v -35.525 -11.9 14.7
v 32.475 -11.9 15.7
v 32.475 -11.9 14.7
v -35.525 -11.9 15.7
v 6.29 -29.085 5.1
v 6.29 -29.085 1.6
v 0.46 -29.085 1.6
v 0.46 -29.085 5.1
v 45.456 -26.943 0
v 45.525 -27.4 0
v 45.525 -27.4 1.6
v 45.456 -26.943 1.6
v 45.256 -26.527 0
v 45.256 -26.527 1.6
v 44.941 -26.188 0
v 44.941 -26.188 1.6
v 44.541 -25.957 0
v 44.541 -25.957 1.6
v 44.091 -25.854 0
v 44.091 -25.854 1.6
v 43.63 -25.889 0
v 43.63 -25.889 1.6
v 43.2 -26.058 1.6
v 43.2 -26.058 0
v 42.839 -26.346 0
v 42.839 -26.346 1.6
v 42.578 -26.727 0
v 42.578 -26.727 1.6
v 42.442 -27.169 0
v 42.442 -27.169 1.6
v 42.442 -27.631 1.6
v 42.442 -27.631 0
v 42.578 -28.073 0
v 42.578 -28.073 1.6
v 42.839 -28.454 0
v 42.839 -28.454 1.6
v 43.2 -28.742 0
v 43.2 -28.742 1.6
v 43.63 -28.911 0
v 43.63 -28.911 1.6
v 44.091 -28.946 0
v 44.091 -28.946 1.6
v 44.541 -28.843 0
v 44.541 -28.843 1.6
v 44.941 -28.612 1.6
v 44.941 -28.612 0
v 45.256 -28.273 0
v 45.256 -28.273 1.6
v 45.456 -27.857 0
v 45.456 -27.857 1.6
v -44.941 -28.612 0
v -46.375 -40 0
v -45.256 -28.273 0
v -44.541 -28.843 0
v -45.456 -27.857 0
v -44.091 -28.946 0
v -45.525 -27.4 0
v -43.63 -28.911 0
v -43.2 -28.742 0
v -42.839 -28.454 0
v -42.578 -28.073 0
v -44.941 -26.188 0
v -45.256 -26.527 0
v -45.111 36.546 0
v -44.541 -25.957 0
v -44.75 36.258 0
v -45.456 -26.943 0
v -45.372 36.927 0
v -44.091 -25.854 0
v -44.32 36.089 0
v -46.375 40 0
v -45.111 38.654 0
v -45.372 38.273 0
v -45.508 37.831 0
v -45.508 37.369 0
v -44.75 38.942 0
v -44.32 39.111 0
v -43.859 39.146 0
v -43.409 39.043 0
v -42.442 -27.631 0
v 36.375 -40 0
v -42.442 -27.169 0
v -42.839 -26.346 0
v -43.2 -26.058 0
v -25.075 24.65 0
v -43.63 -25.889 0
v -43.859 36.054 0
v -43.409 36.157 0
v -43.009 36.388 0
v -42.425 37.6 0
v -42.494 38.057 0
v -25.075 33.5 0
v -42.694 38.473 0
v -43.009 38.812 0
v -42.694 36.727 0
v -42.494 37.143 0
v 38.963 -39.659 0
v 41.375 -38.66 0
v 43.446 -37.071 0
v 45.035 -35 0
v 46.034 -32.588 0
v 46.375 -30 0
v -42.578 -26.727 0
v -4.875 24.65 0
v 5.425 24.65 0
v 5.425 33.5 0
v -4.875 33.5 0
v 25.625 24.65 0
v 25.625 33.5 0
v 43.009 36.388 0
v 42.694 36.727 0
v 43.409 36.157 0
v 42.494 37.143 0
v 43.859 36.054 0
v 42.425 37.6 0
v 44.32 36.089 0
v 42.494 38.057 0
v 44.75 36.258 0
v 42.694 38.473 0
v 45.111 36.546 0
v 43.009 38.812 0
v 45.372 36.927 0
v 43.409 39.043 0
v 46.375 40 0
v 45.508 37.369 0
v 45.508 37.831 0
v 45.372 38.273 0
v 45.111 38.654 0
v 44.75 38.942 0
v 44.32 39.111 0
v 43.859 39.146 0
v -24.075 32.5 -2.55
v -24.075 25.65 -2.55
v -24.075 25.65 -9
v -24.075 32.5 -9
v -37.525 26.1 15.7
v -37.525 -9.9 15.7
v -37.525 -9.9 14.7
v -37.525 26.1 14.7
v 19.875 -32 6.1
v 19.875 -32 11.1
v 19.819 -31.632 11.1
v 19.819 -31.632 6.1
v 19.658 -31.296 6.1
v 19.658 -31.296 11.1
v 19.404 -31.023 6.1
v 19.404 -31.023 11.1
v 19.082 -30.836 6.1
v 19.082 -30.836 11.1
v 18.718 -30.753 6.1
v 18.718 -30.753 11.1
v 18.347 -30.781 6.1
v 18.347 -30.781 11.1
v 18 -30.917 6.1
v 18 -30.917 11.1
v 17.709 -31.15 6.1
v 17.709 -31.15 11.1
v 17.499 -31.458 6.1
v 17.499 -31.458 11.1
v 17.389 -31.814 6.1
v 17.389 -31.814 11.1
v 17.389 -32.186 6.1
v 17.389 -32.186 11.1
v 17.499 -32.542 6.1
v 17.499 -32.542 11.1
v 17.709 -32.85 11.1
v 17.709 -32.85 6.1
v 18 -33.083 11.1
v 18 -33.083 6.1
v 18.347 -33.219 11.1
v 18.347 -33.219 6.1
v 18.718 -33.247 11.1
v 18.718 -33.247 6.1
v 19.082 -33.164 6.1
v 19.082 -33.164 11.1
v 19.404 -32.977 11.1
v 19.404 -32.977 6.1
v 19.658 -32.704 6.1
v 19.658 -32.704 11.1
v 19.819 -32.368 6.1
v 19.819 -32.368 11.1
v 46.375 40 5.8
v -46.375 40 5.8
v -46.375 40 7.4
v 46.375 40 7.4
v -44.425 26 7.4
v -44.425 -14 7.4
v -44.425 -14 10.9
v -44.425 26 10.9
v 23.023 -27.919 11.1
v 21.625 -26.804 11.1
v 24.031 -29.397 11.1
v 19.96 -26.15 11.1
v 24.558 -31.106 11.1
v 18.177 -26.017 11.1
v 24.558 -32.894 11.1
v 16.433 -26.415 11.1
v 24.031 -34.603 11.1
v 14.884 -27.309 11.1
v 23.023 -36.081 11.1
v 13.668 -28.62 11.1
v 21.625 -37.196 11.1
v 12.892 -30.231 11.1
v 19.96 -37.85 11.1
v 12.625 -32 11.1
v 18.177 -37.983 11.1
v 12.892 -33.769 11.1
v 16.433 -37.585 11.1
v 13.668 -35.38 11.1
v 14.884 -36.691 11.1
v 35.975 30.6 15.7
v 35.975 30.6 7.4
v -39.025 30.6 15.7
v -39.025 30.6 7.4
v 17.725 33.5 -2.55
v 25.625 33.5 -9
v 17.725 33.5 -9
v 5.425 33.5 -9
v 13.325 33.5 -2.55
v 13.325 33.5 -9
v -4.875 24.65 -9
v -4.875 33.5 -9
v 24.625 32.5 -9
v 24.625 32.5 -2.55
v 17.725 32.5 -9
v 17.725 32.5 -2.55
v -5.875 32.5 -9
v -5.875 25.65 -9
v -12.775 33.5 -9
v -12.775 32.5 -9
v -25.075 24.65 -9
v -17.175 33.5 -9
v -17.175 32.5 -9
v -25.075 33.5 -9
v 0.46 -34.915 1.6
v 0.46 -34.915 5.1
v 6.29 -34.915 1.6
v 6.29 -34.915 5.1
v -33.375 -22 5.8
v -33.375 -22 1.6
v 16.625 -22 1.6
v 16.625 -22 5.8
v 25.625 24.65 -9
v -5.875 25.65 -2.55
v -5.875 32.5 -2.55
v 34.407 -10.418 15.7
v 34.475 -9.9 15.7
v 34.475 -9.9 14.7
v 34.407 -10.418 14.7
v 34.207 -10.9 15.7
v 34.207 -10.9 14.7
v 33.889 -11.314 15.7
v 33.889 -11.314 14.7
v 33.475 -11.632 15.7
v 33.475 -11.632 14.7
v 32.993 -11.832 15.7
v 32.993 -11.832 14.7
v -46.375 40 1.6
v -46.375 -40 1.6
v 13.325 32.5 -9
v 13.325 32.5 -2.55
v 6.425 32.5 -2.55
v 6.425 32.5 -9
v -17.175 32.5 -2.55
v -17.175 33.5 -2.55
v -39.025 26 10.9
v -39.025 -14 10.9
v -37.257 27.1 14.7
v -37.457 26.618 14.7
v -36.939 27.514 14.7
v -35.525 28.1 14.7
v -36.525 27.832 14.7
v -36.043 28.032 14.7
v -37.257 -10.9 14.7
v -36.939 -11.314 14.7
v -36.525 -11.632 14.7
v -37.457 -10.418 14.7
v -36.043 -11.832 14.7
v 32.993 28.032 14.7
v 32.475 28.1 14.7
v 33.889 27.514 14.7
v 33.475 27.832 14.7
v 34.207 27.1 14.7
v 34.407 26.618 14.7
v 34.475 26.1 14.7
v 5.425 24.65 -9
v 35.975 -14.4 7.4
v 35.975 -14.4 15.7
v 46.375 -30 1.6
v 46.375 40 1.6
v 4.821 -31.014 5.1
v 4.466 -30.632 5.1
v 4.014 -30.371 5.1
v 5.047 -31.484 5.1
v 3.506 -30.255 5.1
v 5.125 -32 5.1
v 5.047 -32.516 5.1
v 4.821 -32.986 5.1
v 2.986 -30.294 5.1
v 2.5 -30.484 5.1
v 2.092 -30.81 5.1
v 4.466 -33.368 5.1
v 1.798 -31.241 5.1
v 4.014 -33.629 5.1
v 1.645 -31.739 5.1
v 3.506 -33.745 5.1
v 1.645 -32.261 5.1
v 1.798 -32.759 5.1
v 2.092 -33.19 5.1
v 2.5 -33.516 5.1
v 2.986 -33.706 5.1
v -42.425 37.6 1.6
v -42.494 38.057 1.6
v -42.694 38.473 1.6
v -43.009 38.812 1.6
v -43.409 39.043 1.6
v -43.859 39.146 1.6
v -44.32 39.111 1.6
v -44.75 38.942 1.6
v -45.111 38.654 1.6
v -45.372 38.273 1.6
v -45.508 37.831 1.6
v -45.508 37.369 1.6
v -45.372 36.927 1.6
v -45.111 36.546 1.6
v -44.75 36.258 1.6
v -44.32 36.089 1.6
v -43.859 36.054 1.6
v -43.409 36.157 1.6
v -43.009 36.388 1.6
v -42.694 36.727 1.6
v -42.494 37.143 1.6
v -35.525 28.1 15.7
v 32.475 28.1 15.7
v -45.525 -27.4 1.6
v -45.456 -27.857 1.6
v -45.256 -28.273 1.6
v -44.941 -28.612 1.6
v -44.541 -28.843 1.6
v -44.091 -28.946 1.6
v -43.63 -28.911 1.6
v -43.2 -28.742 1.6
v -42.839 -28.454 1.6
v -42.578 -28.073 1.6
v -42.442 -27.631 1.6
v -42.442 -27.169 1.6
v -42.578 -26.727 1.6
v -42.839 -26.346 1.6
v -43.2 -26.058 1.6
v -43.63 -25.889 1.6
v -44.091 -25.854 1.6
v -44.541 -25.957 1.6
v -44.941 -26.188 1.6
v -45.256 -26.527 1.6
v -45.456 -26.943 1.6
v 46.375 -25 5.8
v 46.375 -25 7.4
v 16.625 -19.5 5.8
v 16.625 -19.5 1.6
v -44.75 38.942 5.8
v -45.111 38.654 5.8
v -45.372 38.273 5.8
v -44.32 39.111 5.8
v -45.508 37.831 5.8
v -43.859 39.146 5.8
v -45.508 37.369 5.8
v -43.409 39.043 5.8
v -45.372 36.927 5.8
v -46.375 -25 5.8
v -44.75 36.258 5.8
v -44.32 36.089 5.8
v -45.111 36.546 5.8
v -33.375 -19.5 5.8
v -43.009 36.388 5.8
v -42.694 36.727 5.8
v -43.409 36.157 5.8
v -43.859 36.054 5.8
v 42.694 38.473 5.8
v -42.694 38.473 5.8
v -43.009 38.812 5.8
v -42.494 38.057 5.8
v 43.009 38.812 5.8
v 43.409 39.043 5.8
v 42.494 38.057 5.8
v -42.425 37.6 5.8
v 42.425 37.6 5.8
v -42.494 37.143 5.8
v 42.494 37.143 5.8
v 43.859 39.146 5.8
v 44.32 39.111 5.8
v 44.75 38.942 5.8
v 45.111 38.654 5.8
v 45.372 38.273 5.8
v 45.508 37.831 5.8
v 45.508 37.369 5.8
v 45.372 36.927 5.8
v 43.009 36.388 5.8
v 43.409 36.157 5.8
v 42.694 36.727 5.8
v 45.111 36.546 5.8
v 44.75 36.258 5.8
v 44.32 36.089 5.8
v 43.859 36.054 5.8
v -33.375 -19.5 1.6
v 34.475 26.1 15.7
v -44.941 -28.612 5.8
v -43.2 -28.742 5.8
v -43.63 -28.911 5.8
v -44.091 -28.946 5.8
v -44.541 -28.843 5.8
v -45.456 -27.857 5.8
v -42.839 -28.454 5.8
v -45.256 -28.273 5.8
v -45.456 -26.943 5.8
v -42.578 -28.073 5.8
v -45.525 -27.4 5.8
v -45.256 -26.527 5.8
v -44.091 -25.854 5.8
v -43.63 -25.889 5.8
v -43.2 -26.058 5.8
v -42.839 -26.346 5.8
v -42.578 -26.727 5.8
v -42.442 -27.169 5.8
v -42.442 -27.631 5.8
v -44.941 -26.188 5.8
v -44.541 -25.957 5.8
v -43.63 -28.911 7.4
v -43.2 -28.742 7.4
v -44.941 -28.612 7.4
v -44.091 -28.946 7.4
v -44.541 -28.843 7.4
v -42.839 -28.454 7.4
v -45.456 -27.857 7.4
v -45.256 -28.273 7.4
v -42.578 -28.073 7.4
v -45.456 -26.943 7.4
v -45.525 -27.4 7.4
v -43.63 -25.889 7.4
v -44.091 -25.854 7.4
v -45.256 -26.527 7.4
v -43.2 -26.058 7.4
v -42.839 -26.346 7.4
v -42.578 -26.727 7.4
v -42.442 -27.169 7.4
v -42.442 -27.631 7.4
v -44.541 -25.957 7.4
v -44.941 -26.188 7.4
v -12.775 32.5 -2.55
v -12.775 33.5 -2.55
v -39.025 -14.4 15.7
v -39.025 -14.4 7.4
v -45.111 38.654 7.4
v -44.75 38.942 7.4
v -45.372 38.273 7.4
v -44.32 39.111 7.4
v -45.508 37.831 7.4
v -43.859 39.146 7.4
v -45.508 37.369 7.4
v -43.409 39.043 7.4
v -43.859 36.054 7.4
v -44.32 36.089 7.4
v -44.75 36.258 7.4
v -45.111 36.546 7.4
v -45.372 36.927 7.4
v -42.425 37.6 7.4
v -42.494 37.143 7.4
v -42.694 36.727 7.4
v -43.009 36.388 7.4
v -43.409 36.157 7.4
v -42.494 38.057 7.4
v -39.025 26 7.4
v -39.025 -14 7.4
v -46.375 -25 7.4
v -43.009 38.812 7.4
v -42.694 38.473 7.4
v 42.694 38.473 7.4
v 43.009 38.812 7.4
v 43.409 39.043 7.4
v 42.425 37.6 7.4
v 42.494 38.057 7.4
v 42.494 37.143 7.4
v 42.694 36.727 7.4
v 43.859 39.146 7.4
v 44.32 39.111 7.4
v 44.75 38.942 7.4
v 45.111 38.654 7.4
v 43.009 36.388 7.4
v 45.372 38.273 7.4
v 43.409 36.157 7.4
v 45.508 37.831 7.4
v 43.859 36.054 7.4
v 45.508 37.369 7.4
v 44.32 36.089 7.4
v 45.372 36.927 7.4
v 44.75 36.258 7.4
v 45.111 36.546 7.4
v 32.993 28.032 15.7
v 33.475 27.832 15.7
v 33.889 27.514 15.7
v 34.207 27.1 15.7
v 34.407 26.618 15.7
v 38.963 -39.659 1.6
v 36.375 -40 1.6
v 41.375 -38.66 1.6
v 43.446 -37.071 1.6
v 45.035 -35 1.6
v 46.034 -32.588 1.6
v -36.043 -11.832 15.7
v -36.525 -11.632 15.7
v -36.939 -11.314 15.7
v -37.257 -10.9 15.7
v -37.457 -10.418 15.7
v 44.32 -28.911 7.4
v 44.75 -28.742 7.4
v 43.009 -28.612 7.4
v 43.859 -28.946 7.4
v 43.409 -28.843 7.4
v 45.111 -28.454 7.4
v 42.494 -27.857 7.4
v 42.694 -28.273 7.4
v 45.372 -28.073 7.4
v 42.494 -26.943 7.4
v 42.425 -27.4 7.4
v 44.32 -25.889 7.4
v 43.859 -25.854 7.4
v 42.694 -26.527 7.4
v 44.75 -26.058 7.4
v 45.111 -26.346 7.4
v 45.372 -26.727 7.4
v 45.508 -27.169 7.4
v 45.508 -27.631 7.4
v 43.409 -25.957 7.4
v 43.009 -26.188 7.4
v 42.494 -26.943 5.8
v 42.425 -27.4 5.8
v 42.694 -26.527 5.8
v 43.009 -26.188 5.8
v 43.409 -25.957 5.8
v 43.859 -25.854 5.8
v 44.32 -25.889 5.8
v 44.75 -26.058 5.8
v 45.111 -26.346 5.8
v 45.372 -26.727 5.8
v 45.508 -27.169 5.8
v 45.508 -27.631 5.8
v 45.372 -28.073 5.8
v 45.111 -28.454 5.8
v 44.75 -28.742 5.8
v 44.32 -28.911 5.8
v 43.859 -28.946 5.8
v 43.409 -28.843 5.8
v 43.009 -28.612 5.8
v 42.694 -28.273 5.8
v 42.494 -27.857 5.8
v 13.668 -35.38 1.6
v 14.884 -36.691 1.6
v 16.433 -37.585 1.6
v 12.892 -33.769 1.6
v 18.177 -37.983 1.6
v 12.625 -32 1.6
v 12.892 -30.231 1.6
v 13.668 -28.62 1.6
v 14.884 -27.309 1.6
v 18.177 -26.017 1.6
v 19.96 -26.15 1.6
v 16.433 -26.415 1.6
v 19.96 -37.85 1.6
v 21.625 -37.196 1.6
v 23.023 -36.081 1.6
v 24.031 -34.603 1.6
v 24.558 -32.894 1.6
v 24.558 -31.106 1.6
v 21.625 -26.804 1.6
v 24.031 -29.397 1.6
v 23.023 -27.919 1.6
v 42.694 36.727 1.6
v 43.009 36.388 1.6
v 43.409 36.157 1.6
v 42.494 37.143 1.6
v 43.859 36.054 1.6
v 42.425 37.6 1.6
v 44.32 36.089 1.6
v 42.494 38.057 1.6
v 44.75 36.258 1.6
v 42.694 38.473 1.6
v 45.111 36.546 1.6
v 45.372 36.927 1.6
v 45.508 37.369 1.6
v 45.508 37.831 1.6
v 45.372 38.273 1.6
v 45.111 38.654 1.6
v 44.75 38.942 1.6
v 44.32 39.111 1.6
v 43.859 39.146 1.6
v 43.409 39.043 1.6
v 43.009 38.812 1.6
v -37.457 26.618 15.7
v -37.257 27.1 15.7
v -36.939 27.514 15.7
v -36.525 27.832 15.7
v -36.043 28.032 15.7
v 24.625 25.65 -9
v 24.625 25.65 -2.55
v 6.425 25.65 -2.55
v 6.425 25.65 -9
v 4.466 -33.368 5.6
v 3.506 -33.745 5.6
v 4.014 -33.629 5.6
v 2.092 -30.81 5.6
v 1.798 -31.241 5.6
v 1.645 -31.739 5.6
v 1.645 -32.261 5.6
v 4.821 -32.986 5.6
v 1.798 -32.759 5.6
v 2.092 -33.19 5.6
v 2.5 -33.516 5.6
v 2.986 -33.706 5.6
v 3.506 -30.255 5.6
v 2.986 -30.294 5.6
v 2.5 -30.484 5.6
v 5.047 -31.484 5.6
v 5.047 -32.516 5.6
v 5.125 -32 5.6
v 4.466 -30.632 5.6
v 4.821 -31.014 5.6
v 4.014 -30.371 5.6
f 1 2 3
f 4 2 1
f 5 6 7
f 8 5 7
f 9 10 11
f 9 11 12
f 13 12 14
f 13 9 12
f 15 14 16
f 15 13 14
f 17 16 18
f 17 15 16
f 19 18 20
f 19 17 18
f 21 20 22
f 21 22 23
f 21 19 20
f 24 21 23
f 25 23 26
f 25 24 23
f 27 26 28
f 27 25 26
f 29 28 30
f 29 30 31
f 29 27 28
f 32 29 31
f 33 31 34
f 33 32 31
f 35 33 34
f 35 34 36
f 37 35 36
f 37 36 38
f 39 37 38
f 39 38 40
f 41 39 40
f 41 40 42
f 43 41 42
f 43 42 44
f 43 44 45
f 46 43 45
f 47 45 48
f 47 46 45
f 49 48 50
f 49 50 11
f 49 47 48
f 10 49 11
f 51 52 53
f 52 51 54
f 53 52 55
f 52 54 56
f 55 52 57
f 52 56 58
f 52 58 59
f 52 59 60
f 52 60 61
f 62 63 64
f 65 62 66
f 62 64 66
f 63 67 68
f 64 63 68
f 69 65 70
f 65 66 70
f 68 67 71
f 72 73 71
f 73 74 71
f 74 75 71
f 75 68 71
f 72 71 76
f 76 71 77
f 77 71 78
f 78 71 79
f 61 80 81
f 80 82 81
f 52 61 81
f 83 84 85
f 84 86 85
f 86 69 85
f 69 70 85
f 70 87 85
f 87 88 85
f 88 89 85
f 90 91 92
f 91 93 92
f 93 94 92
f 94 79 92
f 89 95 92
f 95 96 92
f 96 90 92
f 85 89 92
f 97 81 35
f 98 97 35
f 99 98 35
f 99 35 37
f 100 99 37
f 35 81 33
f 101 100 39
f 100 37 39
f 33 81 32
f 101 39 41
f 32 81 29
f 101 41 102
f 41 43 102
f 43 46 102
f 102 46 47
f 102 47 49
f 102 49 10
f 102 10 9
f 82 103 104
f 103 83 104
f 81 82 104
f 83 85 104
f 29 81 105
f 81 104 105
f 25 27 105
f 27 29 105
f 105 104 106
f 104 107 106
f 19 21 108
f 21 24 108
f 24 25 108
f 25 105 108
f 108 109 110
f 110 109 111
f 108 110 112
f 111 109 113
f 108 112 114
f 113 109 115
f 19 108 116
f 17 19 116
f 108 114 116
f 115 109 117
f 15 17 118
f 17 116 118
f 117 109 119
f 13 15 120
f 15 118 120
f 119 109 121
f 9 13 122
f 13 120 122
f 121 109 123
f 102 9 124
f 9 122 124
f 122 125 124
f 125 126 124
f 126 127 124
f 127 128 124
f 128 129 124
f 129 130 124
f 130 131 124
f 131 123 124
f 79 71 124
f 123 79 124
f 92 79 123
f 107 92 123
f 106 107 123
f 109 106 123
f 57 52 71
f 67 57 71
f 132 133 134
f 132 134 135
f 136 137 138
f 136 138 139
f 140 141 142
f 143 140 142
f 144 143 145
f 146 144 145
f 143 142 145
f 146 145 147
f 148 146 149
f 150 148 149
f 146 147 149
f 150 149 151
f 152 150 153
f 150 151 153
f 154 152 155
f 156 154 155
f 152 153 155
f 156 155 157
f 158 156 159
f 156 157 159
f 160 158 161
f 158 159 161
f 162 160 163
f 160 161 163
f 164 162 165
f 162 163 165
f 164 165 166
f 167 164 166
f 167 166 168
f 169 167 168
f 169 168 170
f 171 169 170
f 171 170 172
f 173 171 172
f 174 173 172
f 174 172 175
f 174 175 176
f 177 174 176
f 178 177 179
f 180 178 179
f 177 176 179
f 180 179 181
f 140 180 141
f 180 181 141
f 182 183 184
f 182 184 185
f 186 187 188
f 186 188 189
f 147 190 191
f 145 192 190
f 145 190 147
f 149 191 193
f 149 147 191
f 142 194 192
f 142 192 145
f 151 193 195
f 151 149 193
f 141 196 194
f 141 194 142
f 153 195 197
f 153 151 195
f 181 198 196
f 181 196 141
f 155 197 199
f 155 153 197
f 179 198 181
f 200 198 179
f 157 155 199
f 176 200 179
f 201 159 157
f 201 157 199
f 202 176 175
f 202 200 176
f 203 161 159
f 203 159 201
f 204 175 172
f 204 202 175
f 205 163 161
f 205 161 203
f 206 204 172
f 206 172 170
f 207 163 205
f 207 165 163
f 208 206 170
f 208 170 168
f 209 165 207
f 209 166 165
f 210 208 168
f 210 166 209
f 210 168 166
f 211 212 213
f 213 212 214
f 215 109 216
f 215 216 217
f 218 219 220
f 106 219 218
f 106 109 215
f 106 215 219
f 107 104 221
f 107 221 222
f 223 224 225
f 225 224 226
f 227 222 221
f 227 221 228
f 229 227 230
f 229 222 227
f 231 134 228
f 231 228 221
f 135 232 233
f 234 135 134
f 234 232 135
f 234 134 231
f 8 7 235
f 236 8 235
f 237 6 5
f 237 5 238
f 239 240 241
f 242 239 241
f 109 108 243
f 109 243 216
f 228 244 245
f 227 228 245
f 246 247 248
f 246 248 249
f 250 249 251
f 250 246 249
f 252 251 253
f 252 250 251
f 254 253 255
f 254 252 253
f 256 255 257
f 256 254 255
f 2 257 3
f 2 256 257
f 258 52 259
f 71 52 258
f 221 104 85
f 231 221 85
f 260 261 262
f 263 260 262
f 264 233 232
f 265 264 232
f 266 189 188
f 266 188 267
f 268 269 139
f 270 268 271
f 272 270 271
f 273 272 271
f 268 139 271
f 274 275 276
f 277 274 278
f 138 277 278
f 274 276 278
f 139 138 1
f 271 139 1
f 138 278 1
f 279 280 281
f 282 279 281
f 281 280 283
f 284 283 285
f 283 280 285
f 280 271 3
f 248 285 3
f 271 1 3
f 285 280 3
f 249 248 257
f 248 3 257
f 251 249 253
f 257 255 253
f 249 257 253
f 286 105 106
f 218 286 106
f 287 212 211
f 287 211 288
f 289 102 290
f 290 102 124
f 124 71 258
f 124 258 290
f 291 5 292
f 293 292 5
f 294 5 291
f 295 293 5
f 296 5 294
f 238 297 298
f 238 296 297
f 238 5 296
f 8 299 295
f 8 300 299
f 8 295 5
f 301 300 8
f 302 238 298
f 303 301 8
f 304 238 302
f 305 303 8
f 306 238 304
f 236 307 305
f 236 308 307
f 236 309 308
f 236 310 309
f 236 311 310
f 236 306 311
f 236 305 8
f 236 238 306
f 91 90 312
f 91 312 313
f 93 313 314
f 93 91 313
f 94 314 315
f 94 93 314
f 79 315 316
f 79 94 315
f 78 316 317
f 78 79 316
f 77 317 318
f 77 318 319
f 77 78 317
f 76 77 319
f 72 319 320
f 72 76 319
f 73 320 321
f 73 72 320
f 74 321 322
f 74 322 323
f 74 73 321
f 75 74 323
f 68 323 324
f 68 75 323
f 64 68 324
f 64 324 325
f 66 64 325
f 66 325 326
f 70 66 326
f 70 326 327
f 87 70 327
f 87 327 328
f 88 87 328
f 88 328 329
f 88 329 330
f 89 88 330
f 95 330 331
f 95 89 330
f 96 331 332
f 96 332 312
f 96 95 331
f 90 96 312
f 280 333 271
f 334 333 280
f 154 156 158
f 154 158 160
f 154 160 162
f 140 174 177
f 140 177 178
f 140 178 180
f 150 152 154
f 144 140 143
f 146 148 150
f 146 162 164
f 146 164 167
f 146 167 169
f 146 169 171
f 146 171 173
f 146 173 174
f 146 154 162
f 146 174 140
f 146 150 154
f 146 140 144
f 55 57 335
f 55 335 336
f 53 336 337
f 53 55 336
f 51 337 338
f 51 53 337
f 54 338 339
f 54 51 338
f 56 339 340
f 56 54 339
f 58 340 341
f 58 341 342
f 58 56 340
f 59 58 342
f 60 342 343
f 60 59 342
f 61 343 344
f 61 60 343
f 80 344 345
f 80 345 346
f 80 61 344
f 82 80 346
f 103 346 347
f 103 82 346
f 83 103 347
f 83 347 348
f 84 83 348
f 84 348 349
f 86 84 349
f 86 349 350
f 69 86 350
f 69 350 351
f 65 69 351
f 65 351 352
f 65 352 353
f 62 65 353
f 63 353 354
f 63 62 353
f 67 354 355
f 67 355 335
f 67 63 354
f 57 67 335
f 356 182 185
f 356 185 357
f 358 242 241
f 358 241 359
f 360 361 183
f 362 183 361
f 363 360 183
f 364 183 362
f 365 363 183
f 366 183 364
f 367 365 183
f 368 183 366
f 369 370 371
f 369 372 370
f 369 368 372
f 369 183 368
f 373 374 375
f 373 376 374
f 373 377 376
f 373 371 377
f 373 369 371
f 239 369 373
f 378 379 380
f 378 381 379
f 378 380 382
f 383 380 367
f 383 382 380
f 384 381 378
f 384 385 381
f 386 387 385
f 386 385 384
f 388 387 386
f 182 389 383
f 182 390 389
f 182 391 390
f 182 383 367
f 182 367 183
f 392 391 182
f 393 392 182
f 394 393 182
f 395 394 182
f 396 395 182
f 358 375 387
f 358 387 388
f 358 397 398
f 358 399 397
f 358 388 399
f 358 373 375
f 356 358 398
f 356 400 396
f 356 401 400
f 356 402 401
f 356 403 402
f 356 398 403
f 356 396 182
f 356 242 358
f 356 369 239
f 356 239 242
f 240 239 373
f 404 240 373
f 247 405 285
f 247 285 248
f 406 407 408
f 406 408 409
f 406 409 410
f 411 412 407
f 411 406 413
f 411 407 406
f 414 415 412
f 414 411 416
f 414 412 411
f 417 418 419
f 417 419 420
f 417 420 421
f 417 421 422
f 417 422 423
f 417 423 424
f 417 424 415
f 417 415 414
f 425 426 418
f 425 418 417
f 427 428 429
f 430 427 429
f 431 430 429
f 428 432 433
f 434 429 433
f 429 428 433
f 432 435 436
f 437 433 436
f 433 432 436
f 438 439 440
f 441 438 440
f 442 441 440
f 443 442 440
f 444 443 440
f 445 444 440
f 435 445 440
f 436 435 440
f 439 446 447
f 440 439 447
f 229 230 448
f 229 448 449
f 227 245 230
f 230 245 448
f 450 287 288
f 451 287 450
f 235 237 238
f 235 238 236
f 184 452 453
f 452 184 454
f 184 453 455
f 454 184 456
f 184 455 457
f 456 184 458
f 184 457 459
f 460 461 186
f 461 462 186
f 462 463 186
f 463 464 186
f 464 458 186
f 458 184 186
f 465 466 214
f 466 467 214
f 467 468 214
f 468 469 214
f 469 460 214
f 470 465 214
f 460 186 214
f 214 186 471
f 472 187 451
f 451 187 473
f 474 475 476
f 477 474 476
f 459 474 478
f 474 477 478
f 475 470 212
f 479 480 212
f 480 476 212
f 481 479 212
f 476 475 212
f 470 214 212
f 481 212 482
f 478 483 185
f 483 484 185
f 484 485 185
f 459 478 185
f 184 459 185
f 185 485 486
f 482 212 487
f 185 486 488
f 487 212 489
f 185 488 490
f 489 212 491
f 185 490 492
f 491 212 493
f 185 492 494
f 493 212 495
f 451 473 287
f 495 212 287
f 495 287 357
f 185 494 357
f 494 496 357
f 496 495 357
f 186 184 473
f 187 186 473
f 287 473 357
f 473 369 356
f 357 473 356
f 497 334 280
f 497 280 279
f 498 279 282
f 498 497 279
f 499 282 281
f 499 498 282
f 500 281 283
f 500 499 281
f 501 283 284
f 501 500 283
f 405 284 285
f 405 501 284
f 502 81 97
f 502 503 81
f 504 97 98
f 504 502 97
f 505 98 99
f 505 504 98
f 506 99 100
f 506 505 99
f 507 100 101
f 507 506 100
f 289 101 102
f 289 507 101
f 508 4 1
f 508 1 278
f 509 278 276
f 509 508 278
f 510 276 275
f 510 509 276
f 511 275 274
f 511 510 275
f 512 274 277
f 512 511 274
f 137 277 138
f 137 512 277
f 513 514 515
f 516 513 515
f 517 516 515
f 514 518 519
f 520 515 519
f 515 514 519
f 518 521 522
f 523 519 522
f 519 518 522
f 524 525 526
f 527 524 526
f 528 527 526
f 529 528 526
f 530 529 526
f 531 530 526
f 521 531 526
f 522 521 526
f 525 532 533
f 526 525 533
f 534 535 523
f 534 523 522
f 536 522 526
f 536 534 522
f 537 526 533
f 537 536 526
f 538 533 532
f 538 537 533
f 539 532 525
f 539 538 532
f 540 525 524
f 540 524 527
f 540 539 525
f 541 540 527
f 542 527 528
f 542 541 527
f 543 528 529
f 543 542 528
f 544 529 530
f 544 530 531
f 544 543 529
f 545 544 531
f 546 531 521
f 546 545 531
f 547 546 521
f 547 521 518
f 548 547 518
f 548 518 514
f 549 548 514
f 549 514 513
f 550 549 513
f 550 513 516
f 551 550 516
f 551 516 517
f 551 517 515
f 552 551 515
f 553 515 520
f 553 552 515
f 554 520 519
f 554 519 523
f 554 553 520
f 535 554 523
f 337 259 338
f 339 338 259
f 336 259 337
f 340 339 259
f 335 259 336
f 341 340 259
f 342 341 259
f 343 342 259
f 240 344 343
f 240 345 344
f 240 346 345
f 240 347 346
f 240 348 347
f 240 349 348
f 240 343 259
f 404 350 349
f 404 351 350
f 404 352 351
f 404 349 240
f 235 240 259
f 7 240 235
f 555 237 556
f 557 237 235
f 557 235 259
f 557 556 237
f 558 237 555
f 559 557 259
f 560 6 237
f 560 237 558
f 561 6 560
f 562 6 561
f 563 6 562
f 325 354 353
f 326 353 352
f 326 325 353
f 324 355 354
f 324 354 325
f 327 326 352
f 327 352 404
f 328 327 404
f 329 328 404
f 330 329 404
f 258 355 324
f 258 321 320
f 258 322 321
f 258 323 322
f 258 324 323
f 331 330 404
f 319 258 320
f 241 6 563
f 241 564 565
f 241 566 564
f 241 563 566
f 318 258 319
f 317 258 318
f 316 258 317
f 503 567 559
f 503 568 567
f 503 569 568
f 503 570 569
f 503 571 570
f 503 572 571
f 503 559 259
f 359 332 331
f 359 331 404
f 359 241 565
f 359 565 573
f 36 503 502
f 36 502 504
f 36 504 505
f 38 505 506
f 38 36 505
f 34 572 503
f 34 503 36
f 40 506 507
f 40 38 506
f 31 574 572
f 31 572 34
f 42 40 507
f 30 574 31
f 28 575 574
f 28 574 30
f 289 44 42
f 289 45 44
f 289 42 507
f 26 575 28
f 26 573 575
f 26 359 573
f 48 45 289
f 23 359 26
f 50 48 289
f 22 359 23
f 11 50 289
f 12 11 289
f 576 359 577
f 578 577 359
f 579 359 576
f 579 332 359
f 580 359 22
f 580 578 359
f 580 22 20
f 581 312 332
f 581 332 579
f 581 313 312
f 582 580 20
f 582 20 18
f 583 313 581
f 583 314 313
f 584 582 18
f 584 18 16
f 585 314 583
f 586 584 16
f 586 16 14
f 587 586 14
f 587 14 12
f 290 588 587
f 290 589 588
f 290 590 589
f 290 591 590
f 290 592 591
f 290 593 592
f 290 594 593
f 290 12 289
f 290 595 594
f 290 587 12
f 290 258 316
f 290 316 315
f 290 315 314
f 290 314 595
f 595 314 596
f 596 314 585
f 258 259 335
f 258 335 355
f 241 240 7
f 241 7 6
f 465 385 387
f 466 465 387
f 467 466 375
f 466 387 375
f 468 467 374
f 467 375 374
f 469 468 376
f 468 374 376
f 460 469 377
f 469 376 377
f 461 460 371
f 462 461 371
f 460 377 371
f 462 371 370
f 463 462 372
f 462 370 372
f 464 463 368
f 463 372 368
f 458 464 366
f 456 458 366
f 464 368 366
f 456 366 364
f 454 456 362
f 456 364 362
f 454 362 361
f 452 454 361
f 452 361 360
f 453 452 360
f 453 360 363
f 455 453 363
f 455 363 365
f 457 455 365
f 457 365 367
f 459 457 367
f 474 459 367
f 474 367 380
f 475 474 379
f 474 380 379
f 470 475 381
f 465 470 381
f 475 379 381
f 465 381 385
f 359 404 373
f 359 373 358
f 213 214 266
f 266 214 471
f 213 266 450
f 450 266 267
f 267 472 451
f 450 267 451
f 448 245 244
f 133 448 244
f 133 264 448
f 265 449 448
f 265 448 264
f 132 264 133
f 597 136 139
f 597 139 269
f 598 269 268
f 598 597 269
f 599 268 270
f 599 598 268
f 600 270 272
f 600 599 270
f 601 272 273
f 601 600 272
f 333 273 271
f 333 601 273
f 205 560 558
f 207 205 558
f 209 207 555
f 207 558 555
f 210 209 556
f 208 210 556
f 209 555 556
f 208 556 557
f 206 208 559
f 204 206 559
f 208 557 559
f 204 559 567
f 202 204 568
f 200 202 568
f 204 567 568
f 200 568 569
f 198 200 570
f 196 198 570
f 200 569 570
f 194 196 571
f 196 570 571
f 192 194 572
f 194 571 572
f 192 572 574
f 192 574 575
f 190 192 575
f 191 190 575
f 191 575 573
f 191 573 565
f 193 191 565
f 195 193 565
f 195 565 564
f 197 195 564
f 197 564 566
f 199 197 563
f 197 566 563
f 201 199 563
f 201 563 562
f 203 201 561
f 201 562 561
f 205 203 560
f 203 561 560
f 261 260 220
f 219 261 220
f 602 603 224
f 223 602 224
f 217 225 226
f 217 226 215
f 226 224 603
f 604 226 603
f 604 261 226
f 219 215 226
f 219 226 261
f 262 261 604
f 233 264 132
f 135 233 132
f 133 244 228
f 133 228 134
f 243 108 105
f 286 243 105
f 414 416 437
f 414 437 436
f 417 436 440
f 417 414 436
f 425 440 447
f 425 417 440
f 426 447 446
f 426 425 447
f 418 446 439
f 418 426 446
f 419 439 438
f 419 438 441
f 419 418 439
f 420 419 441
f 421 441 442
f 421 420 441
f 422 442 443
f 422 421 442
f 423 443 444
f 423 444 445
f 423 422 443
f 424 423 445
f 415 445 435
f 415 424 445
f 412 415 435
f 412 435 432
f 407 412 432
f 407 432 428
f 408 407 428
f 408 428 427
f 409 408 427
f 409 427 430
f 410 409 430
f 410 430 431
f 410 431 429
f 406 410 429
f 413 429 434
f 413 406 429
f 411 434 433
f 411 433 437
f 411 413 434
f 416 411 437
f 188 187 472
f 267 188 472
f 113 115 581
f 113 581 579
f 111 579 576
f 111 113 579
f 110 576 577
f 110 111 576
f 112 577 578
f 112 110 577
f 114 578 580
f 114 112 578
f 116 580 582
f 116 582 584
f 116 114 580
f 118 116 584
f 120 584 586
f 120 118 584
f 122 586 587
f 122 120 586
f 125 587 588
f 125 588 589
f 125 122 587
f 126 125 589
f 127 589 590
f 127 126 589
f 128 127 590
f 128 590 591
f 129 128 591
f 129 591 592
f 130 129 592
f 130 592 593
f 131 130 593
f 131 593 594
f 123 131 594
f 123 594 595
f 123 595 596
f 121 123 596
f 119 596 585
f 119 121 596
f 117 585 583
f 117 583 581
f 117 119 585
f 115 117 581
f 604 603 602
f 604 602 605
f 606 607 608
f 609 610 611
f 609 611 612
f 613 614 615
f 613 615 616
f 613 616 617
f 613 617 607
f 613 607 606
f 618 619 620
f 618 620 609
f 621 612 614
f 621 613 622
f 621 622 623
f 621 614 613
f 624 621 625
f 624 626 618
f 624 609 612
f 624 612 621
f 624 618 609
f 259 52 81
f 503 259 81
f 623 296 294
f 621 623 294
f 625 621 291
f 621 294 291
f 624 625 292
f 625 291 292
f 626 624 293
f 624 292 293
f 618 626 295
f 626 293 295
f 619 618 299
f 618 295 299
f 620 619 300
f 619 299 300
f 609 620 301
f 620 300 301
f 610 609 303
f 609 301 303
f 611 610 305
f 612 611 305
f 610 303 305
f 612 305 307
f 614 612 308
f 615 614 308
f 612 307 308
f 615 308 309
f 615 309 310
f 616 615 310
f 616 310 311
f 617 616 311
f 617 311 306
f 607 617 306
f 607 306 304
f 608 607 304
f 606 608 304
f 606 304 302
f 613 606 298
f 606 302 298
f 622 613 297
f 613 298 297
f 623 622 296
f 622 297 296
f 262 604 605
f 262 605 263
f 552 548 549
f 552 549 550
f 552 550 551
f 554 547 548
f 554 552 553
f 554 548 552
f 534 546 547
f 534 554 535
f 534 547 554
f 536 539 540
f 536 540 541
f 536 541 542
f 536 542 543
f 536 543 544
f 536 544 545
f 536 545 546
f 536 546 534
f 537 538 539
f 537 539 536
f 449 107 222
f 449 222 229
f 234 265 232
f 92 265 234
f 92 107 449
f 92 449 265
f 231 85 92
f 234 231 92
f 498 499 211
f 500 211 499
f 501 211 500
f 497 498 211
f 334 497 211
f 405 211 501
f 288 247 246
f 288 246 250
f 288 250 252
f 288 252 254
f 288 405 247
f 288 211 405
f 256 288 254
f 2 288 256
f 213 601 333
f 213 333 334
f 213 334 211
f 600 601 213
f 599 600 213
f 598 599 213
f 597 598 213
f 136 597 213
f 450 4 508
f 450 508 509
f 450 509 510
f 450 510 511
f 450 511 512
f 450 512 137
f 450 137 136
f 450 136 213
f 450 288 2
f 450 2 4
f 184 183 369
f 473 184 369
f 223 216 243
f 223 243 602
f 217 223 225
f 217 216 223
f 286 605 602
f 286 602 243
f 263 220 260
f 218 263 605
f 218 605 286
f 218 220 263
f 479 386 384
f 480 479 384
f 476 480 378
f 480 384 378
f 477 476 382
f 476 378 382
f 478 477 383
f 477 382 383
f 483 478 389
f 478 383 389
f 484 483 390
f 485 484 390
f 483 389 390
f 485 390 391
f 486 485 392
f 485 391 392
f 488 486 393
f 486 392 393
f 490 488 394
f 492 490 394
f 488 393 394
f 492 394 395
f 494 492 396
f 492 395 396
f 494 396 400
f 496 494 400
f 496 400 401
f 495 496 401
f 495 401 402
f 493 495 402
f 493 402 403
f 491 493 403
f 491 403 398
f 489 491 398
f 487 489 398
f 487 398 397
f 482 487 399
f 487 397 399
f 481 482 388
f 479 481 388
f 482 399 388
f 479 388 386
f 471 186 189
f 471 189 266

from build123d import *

# Parameters (mm, degrees)
SKETCH1_W                             = 92.75
SKETCH1_H                             = 80
SKETCH1_R                             = 1.55
BOSS_EXTRUDE1_FIRST_PCB_DEPTH         = 1.6
SKETCH2_R                             = 6
BOSS_EXTRUDE2_SPEAKER_DEPTH           = 9.5
SKETCH15_R                            = 1.25
CUT_EXTRUDE1_SPEAKER_HOLE_DEPTH       = 5
SKETCH4_W                             = 5.83
SKETCH4_H                             = 5.83
BOSS_EXTRUDE4_RESET_SWITCH_DEPTH      = 3.5
SKETCH5_R                             = 1.75
BOSS_EXTRUDE5_RESET_BUTTON_DEPTH      = 0.5
SKETCH19_W                            = 50
SKETCH19_H                            = 2.5
BOSS_EXTRUDE10_CONNECTOR_DEPTH        = 4.2
SKETCH11_R                            = 1.55
SKETCH11_W                            = 92.75
SKETCH11_H                            = 65
BOSS_EXTRUDE11_UPPER_PCB_DEPTH        = 1.6
SKETCH12_W                            = 75
SKETCH12_H                            = 45
BOSS_EXTRUDE12_LCD_DEPTH              = 8.3
SKETCH24_W                            = 5.4
SKETCH24_H                            = 40
BOSS_EXTRUDE13_LCD_BUMPOUT_DEPTH      = 3.5
CUT_EXTRUDE2_SCREEN_RECESS_DEPTH      = 1
SKETCH21_W                            = 20.2
SKETCH21_H                            = 8.85
SKETCH21_W_2                          = 18.2
SKETCH21_H_2                          = 6.85
BOSS_EXTRUDE14_CONNECTORS_DEPTH       = 9
SKETCH22_W                            = 18.2
SKETCH22_H                            = 6.85
BOSS_EXTRUDE15_CONNECTOR_RECESS_DEPTH = 2.55
SKETCH23_W                            = 4.4
SKETCH23_H                            = 1
CUT_EXTRUDE3_CONNECTOR_NOTCH_DEPTH    = 6.45
FILLET1_R                             = 10


with BuildPart() as part:
    # Sketch1 → Boss-Extrude1 - First PCB (new body)
    with BuildSketch(Plane.XY):
        Rectangle(SKETCH1_W, SKETCH1_H)
        with Locations((-43.975, 37.6)):
            Circle(SKETCH1_R, mode=Mode.SUBTRACT)
        with Locations(Location((43.975, 37.6, 0), (0, 0, 180))):
            Circle(SKETCH1_R, mode=Mode.SUBTRACT)
        with Locations((43.975, -27.4)):
            Circle(SKETCH1_R, mode=Mode.SUBTRACT)
        with Locations(Location((-43.975, -27.4, 0), (0, 0, 180))):
            Circle(SKETCH1_R, mode=Mode.SUBTRACT)
    extrude(amount=BOSS_EXTRUDE1_FIRST_PCB_DEPTH)

    # Sketch2 → Boss-Extrude2 - Speaker (add)
    with BuildSketch(Plane.XY.offset(1.6)):
        with Locations(Location((18.625, -32, 0), (0, 0, 180))):
            Circle(SKETCH2_R)
    extrude(amount=BOSS_EXTRUDE2_SPEAKER_DEPTH)

    # Sketch15 → Cut-Extrude1 - Speaker Hole (cut)
    with BuildSketch(Plane.XY.offset(11.1)):
        with Locations((18.625, -32)):
            Circle(SKETCH15_R)
    extrude(amount=-CUT_EXTRUDE1_SPEAKER_HOLE_DEPTH, mode=Mode.SUBTRACT)

    # Sketch4 → Boss-Extrude4 - Reset Switch (add)
    with BuildSketch(Plane(origin=(0, 0, 1.6), x_dir=(-1, 0, 0), z_dir=(0, 0, 1))):
        with Locations((-3.375, 32)):
            Rectangle(SKETCH4_W, SKETCH4_H)
    extrude(amount=BOSS_EXTRUDE4_RESET_SWITCH_DEPTH)

    # Sketch5 → Boss-Extrude5 - Reset Button (add)
    with BuildSketch(Plane(origin=(0, 0, 5.1), x_dir=(-1, 0, 0), z_dir=(0, 0, 1))):
        with Locations(Location((-3.375, 32, 0), (0, 0, 180))):
            Circle(SKETCH5_R)
    extrude(amount=BOSS_EXTRUDE5_RESET_BUTTON_DEPTH)

    # Sketch19 → Boss-Extrude10 - Connector (add)
    with BuildSketch(Plane.XY.offset(1.6)):
        with Locations((-8.375, -20.75)):
            Rectangle(SKETCH19_W, SKETCH19_H)
    extrude(amount=BOSS_EXTRUDE10_CONNECTOR_DEPTH)

    # Sketch11 → Boss-Extrude11 - Upper PCB (add)
    # profile 1 of 3: a face of its own
    with BuildSketch(Plane(origin=(0, -2, 5.8), x_dir=(1, 0, 0), z_dir=(0, 0, -1))):
        with Locations(Location((-43.975, 25.4, 0), (0, 0, 180))):
            Circle(SKETCH11_R)
    # profile 2 of 3: a face of its own
    with BuildSketch(Plane(origin=(0, -2, 5.8), x_dir=(1, 0, 0), z_dir=(0, 0, -1))):
        with Locations(Location((43.975, 25.4, 0), (0, 0, 180))):
            Circle(SKETCH11_R)
    # profile 3 of 3: a face of its own
    with BuildSketch(Plane(origin=(0, -2, 5.8), x_dir=(1, 0, 0), z_dir=(0, 0, -1))):
        with Locations((0, -9.5)):
            Rectangle(SKETCH11_W, SKETCH11_H)
        with Locations((-43.975, -39.6)):
            Circle(SKETCH11_R, mode=Mode.SUBTRACT)
        with Locations(Location((43.975, -39.6, 0), (0, 0, 180))):
            Circle(SKETCH11_R, mode=Mode.SUBTRACT)
    extrude(amount=-BOSS_EXTRUDE11_UPPER_PCB_DEPTH)


with BuildPart() as boss_extrude11_upper_pcb_piece_1:
    # of the separate pieces the step leaves, piece 1, a body of its own (boss_extrude11_upper_pcb_pieces)
    add(part.part.solids().sort_by_distance((46.375, -25, 5.8))[0])

    # Sketch12 → Boss-Extrude12 - LCD (add)
    with BuildSketch(Plane(origin=(0, 0, 7.4), x_dir=(-1, 0, 0), z_dir=(0, 0, 1))):
        with Locations((1.525, -8.1)):
            Rectangle(SKETCH12_W, SKETCH12_H)
    extrude(amount=BOSS_EXTRUDE12_LCD_DEPTH)

    # Sketch24 → Boss-Extrude13 - LCD Bumpout (add)
    with BuildSketch(Plane.XY.offset(7.4)):
        with Locations((-41.725, 6)):
            Rectangle(SKETCH24_W, SKETCH24_H)
    extrude(amount=BOSS_EXTRUDE13_LCD_BUMPOUT_DEPTH)

    # Sketch13 → Cut-Extrude2 - Screen Recess (cut)
    with BuildSketch(Plane(origin=(0, 0, 15.7), x_dir=(-1, 0, 0), z_dir=(0, 0, 1))):
        with BuildLine():
            Line((-32.475, 11.9), (35.525, 11.9))
            ThreePointArc((35.525, 11.9), (36.939213562, 11.314213562), (37.525, 9.9))
            Line((37.525, 9.9), (37.525, -26.1))
            ThreePointArc((37.525, -26.1), (36.939213562, -27.514213562), (35.525, -28.1))
            Line((35.525, -28.1), (-32.475, -28.1))
            ThreePointArc((-32.475, -28.1), (-33.889213562, -27.514213562), (-34.475, -26.1))
            Line((-34.475, -26.1), (-34.475, 9.9))
            ThreePointArc((-34.475, 9.9), (-33.889213562, 11.314213562), (-32.475, 11.9))
        make_face()
    extrude(amount=-CUT_EXTRUDE2_SCREEN_RECESS_DEPTH, mode=Mode.SUBTRACT)

    # Sketch21 → Boss-Extrude14 - Connectors (add)
    # profile 1 of 2: a face of its own
    with BuildSketch(Plane(origin=(0, 0, 0), x_dir=(-1, 0, 0), z_dir=(0, 0, -1))):
        with Locations((-15.525, 29.075)):
            Rectangle(SKETCH21_W, SKETCH21_H)
        with Locations((-15.525, 29.075)):
            Rectangle(SKETCH21_W_2, SKETCH21_H_2, mode=Mode.SUBTRACT)
    # profile 2 of 2: a face of its own
    with BuildSketch(Plane(origin=(0, 0, 0), x_dir=(-1, 0, 0), z_dir=(0, 0, -1))):
        with Locations((14.975, 29.075)):
            Rectangle(SKETCH21_W, SKETCH21_H)
        with Locations((14.975, 29.075)):
            Rectangle(SKETCH21_W_2, SKETCH21_H_2, mode=Mode.SUBTRACT)
    extrude(amount=BOSS_EXTRUDE14_CONNECTORS_DEPTH)

    # Sketch22 → Boss-Extrude15 - Connector Recess (add)
    with BuildSketch(Plane(origin=(0, 0, 0), x_dir=(-1, 0, 0), z_dir=(0, 0, -1))):
        with Locations((-15.525, 29.075)):
            Rectangle(SKETCH22_W, SKETCH22_H)
        with Locations((14.975, 29.075)):
            Rectangle(SKETCH22_W, SKETCH22_H)
    extrude(amount=BOSS_EXTRUDE15_CONNECTOR_RECESS_DEPTH)

    # Sketch23 → Cut-Extrude3 - Connector Notch (cut)
    with BuildSketch(Plane(origin=(0, 0, -9), x_dir=(-1, 0, 0), z_dir=(0, 0, -1))):
        with Locations((-15.525, 33)):
            Rectangle(SKETCH23_W, SKETCH23_H)
        with Locations((14.975, 33)):
            Rectangle(SKETCH23_W, SKETCH23_H)
    extrude(amount=-CUT_EXTRUDE3_CONNECTOR_NOTCH_DEPTH, mode=Mode.SUBTRACT)

    # Fillet1
    fillet1_edges = [boss_extrude11_upper_pcb_piece_1.edges().sort_by_distance(p)[0] for p in [
        (46.375, -40, 0.8),
    ]]
    fillet(fillet1_edges, radius=FILLET1_R)


with BuildPart() as boss_extrude11_upper_pcb_piece_2:
    # of the separate pieces the step leaves, piece 2, a body of its own (boss_extrude11_upper_pcb_pieces)
    add(part.part.solids().sort_by_distance((-45.525, -27.4, 5.8))[0])


with BuildPart() as boss_extrude11_upper_pcb_piece_3:
    # of the separate pieces the step leaves, piece 3, a body of its own (boss_extrude11_upper_pcb_pieces)
    add(part.part.solids().sort_by_distance((42.425, -27.4, 5.8))[0])


solid = Compound([boss_extrude11_upper_pcb_piece_1.part, boss_extrude11_upper_pcb_piece_2.part, boss_extrude11_upper_pcb_piece_3.part])
